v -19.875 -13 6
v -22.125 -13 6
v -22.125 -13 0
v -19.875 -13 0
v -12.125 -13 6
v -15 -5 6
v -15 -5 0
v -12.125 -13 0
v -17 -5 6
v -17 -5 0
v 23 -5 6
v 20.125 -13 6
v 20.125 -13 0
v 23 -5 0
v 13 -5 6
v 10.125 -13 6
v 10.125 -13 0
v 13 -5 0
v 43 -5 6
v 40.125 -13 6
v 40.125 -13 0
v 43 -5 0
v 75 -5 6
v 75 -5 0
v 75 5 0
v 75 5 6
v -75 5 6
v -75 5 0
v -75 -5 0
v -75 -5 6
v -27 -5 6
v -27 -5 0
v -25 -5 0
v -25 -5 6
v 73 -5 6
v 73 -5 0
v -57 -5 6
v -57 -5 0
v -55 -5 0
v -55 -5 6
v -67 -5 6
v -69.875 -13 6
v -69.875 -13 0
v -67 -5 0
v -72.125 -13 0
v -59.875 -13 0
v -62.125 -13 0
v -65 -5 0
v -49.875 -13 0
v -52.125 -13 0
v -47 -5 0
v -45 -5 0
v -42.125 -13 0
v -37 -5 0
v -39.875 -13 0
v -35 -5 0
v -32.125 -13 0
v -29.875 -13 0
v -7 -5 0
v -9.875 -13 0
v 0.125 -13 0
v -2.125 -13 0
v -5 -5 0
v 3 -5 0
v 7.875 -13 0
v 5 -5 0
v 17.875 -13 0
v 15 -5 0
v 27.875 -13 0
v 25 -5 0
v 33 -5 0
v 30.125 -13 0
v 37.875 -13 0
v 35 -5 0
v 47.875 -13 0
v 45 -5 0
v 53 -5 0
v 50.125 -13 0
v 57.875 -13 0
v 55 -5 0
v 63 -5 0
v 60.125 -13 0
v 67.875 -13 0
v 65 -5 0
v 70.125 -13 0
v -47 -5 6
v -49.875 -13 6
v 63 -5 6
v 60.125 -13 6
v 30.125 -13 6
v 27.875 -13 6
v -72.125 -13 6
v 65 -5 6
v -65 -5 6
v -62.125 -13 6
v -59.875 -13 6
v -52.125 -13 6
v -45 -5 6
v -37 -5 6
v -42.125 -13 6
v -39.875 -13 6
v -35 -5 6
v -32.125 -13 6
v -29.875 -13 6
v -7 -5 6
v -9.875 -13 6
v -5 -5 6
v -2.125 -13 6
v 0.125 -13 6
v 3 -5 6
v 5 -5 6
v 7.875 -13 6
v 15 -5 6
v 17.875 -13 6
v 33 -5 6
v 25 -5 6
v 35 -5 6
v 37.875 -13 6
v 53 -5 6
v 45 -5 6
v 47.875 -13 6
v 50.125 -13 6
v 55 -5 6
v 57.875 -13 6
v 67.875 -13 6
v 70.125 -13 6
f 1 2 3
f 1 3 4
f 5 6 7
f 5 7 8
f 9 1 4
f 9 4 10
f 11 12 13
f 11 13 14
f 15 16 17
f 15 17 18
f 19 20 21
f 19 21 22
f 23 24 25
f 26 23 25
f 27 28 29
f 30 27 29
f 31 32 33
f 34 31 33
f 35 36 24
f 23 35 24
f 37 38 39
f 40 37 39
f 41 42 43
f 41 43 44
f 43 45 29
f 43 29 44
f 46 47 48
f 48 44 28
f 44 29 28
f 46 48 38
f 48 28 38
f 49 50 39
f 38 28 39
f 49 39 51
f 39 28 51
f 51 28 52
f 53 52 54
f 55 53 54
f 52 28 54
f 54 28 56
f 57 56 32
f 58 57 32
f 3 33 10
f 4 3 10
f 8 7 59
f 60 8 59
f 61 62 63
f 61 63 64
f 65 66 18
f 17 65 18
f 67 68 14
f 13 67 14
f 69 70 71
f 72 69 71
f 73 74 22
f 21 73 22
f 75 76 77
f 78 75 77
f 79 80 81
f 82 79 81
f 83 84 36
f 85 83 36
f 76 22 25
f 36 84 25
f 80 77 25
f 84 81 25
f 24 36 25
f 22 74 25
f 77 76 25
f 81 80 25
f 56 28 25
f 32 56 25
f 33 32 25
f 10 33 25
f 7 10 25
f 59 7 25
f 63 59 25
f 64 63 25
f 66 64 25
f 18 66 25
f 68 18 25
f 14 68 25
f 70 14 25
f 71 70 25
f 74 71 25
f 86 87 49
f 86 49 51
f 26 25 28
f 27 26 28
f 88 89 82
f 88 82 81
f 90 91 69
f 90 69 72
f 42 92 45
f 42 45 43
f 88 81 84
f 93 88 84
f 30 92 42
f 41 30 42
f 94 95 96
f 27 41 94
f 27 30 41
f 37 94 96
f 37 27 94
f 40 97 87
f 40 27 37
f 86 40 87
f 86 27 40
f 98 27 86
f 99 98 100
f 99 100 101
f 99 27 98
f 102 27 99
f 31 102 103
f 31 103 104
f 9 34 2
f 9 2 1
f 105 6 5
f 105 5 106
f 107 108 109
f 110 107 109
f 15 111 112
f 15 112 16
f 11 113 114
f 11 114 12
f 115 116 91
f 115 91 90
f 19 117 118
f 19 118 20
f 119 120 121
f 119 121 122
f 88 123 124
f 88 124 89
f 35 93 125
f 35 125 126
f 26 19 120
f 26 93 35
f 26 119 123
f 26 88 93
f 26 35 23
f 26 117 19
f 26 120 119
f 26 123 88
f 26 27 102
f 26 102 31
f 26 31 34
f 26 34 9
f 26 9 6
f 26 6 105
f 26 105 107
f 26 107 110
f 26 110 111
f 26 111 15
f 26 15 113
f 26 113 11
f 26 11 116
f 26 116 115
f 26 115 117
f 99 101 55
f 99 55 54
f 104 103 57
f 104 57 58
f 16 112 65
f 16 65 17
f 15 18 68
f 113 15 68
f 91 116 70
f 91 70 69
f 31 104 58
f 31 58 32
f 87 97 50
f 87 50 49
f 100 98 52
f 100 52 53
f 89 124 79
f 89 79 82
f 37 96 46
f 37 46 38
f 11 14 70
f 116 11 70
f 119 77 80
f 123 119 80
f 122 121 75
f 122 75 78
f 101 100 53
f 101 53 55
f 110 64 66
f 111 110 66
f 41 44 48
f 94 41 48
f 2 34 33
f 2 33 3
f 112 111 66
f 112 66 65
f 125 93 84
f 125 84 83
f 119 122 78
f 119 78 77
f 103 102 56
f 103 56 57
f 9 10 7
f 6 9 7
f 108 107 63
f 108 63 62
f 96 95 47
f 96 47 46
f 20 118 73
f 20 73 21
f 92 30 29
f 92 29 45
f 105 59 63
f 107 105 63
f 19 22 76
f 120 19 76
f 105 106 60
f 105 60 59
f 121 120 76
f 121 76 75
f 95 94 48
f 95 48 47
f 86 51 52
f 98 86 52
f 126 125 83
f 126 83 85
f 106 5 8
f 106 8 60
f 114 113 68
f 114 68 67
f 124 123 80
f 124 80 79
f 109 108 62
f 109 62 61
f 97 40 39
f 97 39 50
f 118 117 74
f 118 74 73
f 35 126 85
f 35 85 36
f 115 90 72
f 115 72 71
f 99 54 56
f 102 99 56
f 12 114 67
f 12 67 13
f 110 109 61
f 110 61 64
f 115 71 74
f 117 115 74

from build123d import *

# Parameters (mm, degrees)
BOSS_EXTRUDE1_DEPTH = 6
BOSS_EXTRUDE2_DEPTH = 6
LPATTERN1_COUNT     = 15
LPATTERN1_PITCH     = 10


with BuildPart() as part:
    # Sketch1 → Boss-Extrude1 (new body)
    with BuildSketch(Plane.XY):
        Polygon((-75, 5), (-75, -5), (-72, -5), (-70, -5), (-67, -5), (-62, -5), (-60, -5), (-52, -5), (-50, -5), (-42, -5), (-40, -5), (-32, -5), (-30, -5), (-22, -5), (-20, -5), (-12, -5), (-10, -5), (-2, -5), (0, -5), (8, -5), (10, -5), (18, -5), (20, -5), (28, -5), (30, -5), (38, -5), (40, -5), (48, -5), (50, -5), (58, -5), (60, -5), (68, -5), (70, -5), (75, -5), (75, 5), align=None)
    extrude(amount=BOSS_EXTRUDE1_DEPTH)

    # Sketch2 → Boss-Extrude2 (add)
    with BuildSketch(Plane.XY.offset(6)):
        Polygon((-75, -5), (-72.125, -13), (-69.875, -13), (-67, -5), align=None)
    boss_extrude2 = extrude(amount=-BOSS_EXTRUDE2_DEPTH)

    # LPattern1: Boss-Extrude2 ×15
    with Locations(*[(i * LPATTERN1_PITCH, 0, 0) for i in range(1, LPATTERN1_COUNT)]):
        add(boss_extrude2)


solid = part.part
